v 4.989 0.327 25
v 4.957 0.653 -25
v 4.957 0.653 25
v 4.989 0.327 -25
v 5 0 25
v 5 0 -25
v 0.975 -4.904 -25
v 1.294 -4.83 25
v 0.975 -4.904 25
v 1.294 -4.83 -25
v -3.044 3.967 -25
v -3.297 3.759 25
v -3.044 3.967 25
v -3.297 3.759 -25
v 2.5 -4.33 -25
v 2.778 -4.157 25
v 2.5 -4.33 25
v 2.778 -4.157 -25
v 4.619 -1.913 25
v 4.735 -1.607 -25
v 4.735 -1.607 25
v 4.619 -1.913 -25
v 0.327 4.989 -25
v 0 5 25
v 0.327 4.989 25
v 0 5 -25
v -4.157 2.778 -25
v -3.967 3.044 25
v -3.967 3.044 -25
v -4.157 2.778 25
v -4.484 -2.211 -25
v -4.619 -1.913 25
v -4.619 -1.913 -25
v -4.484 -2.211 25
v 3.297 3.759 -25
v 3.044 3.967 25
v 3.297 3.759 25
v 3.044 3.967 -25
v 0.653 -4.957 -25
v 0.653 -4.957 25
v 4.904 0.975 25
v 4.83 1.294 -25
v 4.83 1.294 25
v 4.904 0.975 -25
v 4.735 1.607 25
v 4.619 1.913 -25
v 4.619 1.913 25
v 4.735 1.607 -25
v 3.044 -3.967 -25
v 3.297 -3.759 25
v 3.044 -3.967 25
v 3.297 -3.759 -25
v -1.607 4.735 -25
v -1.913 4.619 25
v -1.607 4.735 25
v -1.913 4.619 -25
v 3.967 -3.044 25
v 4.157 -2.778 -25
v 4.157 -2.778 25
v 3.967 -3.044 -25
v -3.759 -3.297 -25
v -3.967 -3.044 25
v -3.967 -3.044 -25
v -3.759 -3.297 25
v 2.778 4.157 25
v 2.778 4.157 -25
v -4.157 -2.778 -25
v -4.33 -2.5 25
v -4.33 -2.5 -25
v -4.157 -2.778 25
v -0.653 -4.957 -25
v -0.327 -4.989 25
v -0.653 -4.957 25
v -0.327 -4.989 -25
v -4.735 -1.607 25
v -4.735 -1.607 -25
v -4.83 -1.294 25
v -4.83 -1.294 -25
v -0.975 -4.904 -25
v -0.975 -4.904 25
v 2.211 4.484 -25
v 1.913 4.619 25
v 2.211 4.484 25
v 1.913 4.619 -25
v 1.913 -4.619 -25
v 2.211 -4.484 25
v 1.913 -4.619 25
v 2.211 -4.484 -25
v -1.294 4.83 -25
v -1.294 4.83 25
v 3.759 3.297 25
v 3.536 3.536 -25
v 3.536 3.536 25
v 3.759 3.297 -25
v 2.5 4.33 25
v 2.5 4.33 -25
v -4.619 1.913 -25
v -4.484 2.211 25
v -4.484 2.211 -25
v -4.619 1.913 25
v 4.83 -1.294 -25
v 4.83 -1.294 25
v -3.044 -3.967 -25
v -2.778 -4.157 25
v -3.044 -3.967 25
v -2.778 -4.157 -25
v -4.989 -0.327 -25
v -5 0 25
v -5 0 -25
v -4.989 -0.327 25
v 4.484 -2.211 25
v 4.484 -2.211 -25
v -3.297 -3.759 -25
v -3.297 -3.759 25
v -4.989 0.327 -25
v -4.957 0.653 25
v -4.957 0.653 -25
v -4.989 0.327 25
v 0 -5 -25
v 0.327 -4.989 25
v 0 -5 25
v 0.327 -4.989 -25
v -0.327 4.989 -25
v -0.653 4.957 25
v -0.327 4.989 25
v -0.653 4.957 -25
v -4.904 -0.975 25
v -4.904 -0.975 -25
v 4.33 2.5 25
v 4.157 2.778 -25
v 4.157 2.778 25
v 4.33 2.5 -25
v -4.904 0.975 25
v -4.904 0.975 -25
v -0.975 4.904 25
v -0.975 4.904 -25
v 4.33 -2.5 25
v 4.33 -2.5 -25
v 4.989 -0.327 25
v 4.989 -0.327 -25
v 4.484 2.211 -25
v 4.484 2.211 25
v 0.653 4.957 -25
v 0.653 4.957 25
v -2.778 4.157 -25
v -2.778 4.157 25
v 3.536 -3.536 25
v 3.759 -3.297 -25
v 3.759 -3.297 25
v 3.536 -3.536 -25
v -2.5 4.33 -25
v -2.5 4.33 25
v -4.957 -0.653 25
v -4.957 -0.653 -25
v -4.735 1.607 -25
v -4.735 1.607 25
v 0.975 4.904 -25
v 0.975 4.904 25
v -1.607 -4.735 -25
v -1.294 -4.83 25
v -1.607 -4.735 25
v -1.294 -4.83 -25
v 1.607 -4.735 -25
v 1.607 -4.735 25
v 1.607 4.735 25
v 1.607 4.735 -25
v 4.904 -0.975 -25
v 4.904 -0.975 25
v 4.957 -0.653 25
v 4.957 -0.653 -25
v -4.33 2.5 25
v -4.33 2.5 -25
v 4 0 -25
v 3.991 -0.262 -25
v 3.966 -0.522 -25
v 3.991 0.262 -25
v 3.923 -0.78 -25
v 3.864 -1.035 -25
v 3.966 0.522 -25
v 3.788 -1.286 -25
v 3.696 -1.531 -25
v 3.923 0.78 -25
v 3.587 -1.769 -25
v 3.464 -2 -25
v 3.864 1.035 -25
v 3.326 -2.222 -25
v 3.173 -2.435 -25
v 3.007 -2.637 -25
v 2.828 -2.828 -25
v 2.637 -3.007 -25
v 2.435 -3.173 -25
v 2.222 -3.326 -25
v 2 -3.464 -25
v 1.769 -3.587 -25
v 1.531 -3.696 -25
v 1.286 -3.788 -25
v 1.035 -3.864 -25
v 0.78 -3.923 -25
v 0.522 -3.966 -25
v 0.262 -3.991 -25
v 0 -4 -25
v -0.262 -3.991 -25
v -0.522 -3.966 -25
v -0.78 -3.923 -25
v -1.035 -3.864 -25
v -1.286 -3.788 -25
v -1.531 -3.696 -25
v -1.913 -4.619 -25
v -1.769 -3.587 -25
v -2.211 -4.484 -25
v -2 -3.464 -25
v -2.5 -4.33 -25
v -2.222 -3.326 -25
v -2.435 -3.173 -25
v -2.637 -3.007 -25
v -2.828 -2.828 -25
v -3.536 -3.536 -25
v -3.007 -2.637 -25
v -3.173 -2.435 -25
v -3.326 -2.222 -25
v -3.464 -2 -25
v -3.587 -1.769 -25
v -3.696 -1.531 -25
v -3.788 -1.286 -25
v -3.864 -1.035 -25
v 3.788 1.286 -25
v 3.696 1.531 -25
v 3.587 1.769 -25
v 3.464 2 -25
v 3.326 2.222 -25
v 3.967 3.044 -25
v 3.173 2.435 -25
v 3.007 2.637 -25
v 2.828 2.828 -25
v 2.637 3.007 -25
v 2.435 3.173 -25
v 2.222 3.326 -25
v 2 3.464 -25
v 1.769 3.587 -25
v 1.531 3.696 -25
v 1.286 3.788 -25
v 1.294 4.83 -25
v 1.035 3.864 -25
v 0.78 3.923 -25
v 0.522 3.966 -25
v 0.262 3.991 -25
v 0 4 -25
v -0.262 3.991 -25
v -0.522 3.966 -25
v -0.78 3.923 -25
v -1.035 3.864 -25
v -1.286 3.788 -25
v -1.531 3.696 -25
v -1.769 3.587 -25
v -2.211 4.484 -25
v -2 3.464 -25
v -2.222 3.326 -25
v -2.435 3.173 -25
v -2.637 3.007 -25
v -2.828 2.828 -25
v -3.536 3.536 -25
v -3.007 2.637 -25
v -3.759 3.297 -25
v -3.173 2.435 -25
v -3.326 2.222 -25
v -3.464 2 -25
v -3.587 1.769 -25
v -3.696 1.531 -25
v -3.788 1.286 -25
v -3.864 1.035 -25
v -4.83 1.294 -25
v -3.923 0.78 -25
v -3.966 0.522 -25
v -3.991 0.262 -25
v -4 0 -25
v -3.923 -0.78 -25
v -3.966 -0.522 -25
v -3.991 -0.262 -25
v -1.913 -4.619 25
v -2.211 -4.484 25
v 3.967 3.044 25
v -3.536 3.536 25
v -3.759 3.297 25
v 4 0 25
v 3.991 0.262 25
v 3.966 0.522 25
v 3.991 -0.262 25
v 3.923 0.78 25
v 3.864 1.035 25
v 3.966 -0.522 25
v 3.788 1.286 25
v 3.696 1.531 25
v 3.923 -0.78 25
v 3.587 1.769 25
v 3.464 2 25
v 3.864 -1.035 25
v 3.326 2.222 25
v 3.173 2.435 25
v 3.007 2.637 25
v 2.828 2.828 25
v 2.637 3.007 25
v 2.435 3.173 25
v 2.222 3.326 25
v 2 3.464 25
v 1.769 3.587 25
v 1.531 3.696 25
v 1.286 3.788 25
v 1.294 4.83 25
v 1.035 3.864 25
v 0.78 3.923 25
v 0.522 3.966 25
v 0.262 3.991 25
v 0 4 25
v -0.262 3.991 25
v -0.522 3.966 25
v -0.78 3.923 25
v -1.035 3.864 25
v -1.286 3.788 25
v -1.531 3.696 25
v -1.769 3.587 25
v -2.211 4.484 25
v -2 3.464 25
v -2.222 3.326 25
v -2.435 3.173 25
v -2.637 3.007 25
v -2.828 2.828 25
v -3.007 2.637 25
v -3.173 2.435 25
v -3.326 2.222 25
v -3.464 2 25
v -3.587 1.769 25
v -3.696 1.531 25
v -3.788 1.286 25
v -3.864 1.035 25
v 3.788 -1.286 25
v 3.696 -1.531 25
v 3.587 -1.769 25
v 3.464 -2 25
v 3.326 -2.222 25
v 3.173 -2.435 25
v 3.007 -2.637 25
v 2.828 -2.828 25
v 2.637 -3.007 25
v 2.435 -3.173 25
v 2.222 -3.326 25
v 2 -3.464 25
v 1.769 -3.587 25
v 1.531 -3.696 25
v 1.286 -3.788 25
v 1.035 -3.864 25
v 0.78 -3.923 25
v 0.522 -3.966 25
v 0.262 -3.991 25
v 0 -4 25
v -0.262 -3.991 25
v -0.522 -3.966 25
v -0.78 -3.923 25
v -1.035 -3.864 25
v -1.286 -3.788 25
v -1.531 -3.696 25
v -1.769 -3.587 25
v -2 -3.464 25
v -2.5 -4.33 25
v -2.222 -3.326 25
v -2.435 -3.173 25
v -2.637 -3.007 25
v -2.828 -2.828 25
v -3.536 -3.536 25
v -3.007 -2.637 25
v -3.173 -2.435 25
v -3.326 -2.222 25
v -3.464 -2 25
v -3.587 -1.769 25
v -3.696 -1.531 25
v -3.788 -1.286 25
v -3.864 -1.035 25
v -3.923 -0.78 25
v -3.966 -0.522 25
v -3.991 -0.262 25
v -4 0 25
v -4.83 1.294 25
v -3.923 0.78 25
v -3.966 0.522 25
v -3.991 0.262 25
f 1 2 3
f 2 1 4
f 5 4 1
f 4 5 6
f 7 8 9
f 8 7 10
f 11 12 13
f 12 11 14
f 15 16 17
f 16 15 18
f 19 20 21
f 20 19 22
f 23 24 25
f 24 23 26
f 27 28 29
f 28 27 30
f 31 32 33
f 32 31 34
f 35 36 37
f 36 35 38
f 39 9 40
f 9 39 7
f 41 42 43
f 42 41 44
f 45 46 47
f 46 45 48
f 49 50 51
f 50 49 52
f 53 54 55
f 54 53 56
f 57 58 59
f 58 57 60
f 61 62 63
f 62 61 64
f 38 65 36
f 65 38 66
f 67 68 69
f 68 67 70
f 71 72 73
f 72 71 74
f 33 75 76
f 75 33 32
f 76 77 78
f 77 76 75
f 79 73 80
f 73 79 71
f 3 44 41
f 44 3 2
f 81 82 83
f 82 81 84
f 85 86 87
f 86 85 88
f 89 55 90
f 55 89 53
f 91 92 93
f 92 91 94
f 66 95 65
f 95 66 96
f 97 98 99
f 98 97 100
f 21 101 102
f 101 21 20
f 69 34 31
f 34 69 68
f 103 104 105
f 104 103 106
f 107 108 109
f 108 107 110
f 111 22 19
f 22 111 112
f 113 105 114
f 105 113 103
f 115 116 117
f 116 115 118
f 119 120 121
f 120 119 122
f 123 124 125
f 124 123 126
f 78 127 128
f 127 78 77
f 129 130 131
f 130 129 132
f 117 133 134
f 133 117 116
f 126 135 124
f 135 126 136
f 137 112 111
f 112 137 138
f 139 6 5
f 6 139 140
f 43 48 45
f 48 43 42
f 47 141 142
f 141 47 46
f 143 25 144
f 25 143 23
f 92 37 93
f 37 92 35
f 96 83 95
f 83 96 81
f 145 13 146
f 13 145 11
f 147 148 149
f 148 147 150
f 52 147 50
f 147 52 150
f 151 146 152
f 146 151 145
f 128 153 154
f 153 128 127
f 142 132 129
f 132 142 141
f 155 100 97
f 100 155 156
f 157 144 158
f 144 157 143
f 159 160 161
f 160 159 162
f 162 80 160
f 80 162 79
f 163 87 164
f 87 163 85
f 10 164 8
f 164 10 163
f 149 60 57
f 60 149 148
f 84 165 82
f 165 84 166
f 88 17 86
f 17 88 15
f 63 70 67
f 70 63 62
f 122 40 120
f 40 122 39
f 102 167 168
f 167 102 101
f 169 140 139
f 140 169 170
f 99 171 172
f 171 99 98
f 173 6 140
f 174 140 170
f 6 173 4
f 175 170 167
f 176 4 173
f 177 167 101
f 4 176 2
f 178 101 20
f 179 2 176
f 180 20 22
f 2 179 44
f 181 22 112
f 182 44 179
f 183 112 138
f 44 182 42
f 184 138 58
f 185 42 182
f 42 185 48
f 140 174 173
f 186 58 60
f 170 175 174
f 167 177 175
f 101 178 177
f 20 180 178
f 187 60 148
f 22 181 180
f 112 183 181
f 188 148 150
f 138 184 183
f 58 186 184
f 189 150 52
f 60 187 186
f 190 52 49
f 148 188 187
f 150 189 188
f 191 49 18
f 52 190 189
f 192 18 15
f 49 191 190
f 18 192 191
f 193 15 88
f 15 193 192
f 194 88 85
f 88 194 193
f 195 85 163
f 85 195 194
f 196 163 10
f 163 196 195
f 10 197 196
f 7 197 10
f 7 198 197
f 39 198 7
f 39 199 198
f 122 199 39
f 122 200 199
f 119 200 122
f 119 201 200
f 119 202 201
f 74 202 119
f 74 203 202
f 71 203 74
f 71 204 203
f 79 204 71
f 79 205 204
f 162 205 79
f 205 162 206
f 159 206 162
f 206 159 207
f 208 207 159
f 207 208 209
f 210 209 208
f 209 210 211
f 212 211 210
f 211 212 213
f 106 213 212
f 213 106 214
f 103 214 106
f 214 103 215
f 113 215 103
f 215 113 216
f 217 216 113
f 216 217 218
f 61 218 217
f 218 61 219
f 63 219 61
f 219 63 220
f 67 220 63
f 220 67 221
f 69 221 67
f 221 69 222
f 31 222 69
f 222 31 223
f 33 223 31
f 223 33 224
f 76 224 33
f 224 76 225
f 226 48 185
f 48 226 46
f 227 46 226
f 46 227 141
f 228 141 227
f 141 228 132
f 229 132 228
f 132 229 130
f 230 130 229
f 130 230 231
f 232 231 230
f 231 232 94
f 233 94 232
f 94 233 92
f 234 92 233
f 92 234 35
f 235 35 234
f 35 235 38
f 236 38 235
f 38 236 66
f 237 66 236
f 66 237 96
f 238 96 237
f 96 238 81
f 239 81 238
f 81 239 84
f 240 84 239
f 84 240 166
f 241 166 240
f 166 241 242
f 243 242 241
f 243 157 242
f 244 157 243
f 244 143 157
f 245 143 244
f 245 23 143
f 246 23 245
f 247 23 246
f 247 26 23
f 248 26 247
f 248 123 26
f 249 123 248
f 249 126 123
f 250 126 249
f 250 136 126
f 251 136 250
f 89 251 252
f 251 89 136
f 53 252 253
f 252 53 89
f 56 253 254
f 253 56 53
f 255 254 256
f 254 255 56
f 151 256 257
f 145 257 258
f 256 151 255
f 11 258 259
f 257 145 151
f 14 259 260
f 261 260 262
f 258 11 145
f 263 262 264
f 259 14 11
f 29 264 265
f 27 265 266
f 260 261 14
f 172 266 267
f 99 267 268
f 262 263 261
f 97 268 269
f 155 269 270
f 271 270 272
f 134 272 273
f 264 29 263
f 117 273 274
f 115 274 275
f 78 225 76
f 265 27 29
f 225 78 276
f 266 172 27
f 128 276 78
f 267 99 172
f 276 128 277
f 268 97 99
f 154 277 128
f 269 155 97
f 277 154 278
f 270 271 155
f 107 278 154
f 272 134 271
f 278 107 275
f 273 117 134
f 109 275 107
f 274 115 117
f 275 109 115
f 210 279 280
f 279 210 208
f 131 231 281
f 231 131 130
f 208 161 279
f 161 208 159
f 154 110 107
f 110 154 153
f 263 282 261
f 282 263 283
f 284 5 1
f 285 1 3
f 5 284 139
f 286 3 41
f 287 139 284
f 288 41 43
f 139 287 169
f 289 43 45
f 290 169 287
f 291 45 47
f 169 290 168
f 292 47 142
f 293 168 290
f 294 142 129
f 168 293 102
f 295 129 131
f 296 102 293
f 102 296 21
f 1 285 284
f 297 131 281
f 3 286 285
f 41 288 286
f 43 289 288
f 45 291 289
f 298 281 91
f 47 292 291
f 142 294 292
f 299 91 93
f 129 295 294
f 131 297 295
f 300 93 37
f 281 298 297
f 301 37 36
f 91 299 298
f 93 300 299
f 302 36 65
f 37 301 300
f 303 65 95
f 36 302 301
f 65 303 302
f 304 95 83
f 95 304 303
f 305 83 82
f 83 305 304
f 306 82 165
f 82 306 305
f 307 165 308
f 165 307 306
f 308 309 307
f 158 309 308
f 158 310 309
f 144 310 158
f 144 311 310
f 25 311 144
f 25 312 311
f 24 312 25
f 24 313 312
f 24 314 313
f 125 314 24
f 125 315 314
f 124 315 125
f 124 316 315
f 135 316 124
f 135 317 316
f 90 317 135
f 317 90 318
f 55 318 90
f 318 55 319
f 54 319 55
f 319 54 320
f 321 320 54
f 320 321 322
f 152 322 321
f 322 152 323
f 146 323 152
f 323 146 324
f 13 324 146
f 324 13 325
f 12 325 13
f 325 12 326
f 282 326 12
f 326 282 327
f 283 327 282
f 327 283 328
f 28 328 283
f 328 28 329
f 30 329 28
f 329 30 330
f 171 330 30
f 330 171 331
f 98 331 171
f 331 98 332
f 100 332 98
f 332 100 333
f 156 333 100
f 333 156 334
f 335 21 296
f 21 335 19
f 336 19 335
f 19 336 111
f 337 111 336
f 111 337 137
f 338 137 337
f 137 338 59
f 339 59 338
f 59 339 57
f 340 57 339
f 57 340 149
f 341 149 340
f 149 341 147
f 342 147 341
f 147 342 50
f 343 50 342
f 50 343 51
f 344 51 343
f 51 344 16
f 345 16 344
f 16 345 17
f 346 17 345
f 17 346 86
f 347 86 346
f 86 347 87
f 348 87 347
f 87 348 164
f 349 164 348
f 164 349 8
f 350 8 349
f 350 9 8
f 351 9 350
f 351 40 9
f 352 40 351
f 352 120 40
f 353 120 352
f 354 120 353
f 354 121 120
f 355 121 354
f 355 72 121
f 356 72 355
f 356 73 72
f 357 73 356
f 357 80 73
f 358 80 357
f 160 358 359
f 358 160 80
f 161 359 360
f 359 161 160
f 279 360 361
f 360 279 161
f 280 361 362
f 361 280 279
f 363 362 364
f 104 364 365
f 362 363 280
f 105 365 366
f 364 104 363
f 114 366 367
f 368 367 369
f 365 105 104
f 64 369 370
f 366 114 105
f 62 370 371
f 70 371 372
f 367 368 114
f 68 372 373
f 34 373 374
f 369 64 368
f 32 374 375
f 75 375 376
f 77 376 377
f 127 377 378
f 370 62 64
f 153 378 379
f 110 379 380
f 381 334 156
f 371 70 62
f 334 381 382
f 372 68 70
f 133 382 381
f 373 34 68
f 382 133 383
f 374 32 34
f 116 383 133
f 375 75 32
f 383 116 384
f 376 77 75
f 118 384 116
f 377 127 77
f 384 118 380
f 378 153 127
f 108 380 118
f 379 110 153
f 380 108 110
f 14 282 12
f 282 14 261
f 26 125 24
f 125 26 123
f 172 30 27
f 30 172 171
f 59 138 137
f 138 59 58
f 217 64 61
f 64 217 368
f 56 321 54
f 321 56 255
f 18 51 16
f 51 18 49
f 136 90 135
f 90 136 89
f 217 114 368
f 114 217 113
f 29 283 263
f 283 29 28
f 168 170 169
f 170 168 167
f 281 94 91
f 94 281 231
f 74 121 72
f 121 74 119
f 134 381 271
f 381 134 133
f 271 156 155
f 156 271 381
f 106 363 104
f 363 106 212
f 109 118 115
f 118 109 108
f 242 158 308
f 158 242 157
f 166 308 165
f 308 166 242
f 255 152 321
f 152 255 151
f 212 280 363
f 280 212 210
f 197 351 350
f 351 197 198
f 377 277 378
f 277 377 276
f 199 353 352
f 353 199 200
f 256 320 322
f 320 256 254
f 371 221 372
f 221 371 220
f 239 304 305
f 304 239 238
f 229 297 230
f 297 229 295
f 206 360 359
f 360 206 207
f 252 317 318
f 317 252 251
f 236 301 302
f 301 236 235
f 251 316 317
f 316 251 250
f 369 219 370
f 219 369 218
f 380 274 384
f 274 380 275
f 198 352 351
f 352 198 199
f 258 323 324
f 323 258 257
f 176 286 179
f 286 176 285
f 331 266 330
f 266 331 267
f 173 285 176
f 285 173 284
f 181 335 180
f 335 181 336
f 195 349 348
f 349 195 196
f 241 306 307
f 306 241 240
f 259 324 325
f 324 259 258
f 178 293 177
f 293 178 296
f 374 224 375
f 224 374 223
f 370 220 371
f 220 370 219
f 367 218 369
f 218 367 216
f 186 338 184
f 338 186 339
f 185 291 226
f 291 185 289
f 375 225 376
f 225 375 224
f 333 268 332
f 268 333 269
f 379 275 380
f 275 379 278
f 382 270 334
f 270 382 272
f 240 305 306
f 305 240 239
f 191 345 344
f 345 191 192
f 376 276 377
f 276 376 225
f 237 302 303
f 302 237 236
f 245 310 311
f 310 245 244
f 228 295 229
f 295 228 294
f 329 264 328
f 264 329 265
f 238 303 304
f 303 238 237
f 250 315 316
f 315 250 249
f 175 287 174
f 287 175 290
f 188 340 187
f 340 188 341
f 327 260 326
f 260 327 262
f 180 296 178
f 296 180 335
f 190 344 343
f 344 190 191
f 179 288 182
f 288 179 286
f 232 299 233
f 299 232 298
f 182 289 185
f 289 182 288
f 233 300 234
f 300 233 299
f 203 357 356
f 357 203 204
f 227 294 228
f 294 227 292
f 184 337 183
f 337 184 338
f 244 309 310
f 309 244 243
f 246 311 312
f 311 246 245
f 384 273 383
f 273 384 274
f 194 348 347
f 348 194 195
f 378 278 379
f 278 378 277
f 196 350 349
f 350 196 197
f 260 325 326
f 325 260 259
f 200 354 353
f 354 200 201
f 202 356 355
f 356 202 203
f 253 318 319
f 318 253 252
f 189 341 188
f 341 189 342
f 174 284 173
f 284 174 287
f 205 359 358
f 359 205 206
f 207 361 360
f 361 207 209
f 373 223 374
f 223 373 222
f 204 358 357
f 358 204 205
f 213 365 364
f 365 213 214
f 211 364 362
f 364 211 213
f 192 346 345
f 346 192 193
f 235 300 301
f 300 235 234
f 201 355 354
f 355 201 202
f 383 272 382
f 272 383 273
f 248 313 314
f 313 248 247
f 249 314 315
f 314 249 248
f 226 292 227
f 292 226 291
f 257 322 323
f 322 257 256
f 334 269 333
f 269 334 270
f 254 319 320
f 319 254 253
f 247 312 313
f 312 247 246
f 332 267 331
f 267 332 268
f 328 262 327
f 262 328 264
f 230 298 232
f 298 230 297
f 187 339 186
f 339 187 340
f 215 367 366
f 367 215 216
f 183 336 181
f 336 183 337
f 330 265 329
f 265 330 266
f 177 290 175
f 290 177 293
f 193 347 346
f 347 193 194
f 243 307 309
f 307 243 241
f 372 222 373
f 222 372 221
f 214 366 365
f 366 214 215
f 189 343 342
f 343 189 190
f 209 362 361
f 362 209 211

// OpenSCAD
// Heatshrink sleeving (hollow tube with open ends)

// Parameters
length = 50;            // Overall length
outer_diameter = 10;    // Outer diameter
inner_diameter = 8;     // Inner diameter
material_color = "red"; // Color

$fn = 96;

// Main module
module heatshrink_sleeving() {
    // Robustness to avoid blank/degenerate geometry
    od = max(outer_diameter, 0.01);
    id = min(max(inner_diameter, 0.01), od - 0.02); // ensure wall thickness > 0
    eps = 0.2; // extend bore slightly to guarantee open ends after boolean

    color(material_color)
    difference() {
        cylinder(h = length, d = od, center = true);
        cylinder(h = length + 2*eps, d = id, center = true);
    }
}

// Example usage
heatshrink_sleeving();
